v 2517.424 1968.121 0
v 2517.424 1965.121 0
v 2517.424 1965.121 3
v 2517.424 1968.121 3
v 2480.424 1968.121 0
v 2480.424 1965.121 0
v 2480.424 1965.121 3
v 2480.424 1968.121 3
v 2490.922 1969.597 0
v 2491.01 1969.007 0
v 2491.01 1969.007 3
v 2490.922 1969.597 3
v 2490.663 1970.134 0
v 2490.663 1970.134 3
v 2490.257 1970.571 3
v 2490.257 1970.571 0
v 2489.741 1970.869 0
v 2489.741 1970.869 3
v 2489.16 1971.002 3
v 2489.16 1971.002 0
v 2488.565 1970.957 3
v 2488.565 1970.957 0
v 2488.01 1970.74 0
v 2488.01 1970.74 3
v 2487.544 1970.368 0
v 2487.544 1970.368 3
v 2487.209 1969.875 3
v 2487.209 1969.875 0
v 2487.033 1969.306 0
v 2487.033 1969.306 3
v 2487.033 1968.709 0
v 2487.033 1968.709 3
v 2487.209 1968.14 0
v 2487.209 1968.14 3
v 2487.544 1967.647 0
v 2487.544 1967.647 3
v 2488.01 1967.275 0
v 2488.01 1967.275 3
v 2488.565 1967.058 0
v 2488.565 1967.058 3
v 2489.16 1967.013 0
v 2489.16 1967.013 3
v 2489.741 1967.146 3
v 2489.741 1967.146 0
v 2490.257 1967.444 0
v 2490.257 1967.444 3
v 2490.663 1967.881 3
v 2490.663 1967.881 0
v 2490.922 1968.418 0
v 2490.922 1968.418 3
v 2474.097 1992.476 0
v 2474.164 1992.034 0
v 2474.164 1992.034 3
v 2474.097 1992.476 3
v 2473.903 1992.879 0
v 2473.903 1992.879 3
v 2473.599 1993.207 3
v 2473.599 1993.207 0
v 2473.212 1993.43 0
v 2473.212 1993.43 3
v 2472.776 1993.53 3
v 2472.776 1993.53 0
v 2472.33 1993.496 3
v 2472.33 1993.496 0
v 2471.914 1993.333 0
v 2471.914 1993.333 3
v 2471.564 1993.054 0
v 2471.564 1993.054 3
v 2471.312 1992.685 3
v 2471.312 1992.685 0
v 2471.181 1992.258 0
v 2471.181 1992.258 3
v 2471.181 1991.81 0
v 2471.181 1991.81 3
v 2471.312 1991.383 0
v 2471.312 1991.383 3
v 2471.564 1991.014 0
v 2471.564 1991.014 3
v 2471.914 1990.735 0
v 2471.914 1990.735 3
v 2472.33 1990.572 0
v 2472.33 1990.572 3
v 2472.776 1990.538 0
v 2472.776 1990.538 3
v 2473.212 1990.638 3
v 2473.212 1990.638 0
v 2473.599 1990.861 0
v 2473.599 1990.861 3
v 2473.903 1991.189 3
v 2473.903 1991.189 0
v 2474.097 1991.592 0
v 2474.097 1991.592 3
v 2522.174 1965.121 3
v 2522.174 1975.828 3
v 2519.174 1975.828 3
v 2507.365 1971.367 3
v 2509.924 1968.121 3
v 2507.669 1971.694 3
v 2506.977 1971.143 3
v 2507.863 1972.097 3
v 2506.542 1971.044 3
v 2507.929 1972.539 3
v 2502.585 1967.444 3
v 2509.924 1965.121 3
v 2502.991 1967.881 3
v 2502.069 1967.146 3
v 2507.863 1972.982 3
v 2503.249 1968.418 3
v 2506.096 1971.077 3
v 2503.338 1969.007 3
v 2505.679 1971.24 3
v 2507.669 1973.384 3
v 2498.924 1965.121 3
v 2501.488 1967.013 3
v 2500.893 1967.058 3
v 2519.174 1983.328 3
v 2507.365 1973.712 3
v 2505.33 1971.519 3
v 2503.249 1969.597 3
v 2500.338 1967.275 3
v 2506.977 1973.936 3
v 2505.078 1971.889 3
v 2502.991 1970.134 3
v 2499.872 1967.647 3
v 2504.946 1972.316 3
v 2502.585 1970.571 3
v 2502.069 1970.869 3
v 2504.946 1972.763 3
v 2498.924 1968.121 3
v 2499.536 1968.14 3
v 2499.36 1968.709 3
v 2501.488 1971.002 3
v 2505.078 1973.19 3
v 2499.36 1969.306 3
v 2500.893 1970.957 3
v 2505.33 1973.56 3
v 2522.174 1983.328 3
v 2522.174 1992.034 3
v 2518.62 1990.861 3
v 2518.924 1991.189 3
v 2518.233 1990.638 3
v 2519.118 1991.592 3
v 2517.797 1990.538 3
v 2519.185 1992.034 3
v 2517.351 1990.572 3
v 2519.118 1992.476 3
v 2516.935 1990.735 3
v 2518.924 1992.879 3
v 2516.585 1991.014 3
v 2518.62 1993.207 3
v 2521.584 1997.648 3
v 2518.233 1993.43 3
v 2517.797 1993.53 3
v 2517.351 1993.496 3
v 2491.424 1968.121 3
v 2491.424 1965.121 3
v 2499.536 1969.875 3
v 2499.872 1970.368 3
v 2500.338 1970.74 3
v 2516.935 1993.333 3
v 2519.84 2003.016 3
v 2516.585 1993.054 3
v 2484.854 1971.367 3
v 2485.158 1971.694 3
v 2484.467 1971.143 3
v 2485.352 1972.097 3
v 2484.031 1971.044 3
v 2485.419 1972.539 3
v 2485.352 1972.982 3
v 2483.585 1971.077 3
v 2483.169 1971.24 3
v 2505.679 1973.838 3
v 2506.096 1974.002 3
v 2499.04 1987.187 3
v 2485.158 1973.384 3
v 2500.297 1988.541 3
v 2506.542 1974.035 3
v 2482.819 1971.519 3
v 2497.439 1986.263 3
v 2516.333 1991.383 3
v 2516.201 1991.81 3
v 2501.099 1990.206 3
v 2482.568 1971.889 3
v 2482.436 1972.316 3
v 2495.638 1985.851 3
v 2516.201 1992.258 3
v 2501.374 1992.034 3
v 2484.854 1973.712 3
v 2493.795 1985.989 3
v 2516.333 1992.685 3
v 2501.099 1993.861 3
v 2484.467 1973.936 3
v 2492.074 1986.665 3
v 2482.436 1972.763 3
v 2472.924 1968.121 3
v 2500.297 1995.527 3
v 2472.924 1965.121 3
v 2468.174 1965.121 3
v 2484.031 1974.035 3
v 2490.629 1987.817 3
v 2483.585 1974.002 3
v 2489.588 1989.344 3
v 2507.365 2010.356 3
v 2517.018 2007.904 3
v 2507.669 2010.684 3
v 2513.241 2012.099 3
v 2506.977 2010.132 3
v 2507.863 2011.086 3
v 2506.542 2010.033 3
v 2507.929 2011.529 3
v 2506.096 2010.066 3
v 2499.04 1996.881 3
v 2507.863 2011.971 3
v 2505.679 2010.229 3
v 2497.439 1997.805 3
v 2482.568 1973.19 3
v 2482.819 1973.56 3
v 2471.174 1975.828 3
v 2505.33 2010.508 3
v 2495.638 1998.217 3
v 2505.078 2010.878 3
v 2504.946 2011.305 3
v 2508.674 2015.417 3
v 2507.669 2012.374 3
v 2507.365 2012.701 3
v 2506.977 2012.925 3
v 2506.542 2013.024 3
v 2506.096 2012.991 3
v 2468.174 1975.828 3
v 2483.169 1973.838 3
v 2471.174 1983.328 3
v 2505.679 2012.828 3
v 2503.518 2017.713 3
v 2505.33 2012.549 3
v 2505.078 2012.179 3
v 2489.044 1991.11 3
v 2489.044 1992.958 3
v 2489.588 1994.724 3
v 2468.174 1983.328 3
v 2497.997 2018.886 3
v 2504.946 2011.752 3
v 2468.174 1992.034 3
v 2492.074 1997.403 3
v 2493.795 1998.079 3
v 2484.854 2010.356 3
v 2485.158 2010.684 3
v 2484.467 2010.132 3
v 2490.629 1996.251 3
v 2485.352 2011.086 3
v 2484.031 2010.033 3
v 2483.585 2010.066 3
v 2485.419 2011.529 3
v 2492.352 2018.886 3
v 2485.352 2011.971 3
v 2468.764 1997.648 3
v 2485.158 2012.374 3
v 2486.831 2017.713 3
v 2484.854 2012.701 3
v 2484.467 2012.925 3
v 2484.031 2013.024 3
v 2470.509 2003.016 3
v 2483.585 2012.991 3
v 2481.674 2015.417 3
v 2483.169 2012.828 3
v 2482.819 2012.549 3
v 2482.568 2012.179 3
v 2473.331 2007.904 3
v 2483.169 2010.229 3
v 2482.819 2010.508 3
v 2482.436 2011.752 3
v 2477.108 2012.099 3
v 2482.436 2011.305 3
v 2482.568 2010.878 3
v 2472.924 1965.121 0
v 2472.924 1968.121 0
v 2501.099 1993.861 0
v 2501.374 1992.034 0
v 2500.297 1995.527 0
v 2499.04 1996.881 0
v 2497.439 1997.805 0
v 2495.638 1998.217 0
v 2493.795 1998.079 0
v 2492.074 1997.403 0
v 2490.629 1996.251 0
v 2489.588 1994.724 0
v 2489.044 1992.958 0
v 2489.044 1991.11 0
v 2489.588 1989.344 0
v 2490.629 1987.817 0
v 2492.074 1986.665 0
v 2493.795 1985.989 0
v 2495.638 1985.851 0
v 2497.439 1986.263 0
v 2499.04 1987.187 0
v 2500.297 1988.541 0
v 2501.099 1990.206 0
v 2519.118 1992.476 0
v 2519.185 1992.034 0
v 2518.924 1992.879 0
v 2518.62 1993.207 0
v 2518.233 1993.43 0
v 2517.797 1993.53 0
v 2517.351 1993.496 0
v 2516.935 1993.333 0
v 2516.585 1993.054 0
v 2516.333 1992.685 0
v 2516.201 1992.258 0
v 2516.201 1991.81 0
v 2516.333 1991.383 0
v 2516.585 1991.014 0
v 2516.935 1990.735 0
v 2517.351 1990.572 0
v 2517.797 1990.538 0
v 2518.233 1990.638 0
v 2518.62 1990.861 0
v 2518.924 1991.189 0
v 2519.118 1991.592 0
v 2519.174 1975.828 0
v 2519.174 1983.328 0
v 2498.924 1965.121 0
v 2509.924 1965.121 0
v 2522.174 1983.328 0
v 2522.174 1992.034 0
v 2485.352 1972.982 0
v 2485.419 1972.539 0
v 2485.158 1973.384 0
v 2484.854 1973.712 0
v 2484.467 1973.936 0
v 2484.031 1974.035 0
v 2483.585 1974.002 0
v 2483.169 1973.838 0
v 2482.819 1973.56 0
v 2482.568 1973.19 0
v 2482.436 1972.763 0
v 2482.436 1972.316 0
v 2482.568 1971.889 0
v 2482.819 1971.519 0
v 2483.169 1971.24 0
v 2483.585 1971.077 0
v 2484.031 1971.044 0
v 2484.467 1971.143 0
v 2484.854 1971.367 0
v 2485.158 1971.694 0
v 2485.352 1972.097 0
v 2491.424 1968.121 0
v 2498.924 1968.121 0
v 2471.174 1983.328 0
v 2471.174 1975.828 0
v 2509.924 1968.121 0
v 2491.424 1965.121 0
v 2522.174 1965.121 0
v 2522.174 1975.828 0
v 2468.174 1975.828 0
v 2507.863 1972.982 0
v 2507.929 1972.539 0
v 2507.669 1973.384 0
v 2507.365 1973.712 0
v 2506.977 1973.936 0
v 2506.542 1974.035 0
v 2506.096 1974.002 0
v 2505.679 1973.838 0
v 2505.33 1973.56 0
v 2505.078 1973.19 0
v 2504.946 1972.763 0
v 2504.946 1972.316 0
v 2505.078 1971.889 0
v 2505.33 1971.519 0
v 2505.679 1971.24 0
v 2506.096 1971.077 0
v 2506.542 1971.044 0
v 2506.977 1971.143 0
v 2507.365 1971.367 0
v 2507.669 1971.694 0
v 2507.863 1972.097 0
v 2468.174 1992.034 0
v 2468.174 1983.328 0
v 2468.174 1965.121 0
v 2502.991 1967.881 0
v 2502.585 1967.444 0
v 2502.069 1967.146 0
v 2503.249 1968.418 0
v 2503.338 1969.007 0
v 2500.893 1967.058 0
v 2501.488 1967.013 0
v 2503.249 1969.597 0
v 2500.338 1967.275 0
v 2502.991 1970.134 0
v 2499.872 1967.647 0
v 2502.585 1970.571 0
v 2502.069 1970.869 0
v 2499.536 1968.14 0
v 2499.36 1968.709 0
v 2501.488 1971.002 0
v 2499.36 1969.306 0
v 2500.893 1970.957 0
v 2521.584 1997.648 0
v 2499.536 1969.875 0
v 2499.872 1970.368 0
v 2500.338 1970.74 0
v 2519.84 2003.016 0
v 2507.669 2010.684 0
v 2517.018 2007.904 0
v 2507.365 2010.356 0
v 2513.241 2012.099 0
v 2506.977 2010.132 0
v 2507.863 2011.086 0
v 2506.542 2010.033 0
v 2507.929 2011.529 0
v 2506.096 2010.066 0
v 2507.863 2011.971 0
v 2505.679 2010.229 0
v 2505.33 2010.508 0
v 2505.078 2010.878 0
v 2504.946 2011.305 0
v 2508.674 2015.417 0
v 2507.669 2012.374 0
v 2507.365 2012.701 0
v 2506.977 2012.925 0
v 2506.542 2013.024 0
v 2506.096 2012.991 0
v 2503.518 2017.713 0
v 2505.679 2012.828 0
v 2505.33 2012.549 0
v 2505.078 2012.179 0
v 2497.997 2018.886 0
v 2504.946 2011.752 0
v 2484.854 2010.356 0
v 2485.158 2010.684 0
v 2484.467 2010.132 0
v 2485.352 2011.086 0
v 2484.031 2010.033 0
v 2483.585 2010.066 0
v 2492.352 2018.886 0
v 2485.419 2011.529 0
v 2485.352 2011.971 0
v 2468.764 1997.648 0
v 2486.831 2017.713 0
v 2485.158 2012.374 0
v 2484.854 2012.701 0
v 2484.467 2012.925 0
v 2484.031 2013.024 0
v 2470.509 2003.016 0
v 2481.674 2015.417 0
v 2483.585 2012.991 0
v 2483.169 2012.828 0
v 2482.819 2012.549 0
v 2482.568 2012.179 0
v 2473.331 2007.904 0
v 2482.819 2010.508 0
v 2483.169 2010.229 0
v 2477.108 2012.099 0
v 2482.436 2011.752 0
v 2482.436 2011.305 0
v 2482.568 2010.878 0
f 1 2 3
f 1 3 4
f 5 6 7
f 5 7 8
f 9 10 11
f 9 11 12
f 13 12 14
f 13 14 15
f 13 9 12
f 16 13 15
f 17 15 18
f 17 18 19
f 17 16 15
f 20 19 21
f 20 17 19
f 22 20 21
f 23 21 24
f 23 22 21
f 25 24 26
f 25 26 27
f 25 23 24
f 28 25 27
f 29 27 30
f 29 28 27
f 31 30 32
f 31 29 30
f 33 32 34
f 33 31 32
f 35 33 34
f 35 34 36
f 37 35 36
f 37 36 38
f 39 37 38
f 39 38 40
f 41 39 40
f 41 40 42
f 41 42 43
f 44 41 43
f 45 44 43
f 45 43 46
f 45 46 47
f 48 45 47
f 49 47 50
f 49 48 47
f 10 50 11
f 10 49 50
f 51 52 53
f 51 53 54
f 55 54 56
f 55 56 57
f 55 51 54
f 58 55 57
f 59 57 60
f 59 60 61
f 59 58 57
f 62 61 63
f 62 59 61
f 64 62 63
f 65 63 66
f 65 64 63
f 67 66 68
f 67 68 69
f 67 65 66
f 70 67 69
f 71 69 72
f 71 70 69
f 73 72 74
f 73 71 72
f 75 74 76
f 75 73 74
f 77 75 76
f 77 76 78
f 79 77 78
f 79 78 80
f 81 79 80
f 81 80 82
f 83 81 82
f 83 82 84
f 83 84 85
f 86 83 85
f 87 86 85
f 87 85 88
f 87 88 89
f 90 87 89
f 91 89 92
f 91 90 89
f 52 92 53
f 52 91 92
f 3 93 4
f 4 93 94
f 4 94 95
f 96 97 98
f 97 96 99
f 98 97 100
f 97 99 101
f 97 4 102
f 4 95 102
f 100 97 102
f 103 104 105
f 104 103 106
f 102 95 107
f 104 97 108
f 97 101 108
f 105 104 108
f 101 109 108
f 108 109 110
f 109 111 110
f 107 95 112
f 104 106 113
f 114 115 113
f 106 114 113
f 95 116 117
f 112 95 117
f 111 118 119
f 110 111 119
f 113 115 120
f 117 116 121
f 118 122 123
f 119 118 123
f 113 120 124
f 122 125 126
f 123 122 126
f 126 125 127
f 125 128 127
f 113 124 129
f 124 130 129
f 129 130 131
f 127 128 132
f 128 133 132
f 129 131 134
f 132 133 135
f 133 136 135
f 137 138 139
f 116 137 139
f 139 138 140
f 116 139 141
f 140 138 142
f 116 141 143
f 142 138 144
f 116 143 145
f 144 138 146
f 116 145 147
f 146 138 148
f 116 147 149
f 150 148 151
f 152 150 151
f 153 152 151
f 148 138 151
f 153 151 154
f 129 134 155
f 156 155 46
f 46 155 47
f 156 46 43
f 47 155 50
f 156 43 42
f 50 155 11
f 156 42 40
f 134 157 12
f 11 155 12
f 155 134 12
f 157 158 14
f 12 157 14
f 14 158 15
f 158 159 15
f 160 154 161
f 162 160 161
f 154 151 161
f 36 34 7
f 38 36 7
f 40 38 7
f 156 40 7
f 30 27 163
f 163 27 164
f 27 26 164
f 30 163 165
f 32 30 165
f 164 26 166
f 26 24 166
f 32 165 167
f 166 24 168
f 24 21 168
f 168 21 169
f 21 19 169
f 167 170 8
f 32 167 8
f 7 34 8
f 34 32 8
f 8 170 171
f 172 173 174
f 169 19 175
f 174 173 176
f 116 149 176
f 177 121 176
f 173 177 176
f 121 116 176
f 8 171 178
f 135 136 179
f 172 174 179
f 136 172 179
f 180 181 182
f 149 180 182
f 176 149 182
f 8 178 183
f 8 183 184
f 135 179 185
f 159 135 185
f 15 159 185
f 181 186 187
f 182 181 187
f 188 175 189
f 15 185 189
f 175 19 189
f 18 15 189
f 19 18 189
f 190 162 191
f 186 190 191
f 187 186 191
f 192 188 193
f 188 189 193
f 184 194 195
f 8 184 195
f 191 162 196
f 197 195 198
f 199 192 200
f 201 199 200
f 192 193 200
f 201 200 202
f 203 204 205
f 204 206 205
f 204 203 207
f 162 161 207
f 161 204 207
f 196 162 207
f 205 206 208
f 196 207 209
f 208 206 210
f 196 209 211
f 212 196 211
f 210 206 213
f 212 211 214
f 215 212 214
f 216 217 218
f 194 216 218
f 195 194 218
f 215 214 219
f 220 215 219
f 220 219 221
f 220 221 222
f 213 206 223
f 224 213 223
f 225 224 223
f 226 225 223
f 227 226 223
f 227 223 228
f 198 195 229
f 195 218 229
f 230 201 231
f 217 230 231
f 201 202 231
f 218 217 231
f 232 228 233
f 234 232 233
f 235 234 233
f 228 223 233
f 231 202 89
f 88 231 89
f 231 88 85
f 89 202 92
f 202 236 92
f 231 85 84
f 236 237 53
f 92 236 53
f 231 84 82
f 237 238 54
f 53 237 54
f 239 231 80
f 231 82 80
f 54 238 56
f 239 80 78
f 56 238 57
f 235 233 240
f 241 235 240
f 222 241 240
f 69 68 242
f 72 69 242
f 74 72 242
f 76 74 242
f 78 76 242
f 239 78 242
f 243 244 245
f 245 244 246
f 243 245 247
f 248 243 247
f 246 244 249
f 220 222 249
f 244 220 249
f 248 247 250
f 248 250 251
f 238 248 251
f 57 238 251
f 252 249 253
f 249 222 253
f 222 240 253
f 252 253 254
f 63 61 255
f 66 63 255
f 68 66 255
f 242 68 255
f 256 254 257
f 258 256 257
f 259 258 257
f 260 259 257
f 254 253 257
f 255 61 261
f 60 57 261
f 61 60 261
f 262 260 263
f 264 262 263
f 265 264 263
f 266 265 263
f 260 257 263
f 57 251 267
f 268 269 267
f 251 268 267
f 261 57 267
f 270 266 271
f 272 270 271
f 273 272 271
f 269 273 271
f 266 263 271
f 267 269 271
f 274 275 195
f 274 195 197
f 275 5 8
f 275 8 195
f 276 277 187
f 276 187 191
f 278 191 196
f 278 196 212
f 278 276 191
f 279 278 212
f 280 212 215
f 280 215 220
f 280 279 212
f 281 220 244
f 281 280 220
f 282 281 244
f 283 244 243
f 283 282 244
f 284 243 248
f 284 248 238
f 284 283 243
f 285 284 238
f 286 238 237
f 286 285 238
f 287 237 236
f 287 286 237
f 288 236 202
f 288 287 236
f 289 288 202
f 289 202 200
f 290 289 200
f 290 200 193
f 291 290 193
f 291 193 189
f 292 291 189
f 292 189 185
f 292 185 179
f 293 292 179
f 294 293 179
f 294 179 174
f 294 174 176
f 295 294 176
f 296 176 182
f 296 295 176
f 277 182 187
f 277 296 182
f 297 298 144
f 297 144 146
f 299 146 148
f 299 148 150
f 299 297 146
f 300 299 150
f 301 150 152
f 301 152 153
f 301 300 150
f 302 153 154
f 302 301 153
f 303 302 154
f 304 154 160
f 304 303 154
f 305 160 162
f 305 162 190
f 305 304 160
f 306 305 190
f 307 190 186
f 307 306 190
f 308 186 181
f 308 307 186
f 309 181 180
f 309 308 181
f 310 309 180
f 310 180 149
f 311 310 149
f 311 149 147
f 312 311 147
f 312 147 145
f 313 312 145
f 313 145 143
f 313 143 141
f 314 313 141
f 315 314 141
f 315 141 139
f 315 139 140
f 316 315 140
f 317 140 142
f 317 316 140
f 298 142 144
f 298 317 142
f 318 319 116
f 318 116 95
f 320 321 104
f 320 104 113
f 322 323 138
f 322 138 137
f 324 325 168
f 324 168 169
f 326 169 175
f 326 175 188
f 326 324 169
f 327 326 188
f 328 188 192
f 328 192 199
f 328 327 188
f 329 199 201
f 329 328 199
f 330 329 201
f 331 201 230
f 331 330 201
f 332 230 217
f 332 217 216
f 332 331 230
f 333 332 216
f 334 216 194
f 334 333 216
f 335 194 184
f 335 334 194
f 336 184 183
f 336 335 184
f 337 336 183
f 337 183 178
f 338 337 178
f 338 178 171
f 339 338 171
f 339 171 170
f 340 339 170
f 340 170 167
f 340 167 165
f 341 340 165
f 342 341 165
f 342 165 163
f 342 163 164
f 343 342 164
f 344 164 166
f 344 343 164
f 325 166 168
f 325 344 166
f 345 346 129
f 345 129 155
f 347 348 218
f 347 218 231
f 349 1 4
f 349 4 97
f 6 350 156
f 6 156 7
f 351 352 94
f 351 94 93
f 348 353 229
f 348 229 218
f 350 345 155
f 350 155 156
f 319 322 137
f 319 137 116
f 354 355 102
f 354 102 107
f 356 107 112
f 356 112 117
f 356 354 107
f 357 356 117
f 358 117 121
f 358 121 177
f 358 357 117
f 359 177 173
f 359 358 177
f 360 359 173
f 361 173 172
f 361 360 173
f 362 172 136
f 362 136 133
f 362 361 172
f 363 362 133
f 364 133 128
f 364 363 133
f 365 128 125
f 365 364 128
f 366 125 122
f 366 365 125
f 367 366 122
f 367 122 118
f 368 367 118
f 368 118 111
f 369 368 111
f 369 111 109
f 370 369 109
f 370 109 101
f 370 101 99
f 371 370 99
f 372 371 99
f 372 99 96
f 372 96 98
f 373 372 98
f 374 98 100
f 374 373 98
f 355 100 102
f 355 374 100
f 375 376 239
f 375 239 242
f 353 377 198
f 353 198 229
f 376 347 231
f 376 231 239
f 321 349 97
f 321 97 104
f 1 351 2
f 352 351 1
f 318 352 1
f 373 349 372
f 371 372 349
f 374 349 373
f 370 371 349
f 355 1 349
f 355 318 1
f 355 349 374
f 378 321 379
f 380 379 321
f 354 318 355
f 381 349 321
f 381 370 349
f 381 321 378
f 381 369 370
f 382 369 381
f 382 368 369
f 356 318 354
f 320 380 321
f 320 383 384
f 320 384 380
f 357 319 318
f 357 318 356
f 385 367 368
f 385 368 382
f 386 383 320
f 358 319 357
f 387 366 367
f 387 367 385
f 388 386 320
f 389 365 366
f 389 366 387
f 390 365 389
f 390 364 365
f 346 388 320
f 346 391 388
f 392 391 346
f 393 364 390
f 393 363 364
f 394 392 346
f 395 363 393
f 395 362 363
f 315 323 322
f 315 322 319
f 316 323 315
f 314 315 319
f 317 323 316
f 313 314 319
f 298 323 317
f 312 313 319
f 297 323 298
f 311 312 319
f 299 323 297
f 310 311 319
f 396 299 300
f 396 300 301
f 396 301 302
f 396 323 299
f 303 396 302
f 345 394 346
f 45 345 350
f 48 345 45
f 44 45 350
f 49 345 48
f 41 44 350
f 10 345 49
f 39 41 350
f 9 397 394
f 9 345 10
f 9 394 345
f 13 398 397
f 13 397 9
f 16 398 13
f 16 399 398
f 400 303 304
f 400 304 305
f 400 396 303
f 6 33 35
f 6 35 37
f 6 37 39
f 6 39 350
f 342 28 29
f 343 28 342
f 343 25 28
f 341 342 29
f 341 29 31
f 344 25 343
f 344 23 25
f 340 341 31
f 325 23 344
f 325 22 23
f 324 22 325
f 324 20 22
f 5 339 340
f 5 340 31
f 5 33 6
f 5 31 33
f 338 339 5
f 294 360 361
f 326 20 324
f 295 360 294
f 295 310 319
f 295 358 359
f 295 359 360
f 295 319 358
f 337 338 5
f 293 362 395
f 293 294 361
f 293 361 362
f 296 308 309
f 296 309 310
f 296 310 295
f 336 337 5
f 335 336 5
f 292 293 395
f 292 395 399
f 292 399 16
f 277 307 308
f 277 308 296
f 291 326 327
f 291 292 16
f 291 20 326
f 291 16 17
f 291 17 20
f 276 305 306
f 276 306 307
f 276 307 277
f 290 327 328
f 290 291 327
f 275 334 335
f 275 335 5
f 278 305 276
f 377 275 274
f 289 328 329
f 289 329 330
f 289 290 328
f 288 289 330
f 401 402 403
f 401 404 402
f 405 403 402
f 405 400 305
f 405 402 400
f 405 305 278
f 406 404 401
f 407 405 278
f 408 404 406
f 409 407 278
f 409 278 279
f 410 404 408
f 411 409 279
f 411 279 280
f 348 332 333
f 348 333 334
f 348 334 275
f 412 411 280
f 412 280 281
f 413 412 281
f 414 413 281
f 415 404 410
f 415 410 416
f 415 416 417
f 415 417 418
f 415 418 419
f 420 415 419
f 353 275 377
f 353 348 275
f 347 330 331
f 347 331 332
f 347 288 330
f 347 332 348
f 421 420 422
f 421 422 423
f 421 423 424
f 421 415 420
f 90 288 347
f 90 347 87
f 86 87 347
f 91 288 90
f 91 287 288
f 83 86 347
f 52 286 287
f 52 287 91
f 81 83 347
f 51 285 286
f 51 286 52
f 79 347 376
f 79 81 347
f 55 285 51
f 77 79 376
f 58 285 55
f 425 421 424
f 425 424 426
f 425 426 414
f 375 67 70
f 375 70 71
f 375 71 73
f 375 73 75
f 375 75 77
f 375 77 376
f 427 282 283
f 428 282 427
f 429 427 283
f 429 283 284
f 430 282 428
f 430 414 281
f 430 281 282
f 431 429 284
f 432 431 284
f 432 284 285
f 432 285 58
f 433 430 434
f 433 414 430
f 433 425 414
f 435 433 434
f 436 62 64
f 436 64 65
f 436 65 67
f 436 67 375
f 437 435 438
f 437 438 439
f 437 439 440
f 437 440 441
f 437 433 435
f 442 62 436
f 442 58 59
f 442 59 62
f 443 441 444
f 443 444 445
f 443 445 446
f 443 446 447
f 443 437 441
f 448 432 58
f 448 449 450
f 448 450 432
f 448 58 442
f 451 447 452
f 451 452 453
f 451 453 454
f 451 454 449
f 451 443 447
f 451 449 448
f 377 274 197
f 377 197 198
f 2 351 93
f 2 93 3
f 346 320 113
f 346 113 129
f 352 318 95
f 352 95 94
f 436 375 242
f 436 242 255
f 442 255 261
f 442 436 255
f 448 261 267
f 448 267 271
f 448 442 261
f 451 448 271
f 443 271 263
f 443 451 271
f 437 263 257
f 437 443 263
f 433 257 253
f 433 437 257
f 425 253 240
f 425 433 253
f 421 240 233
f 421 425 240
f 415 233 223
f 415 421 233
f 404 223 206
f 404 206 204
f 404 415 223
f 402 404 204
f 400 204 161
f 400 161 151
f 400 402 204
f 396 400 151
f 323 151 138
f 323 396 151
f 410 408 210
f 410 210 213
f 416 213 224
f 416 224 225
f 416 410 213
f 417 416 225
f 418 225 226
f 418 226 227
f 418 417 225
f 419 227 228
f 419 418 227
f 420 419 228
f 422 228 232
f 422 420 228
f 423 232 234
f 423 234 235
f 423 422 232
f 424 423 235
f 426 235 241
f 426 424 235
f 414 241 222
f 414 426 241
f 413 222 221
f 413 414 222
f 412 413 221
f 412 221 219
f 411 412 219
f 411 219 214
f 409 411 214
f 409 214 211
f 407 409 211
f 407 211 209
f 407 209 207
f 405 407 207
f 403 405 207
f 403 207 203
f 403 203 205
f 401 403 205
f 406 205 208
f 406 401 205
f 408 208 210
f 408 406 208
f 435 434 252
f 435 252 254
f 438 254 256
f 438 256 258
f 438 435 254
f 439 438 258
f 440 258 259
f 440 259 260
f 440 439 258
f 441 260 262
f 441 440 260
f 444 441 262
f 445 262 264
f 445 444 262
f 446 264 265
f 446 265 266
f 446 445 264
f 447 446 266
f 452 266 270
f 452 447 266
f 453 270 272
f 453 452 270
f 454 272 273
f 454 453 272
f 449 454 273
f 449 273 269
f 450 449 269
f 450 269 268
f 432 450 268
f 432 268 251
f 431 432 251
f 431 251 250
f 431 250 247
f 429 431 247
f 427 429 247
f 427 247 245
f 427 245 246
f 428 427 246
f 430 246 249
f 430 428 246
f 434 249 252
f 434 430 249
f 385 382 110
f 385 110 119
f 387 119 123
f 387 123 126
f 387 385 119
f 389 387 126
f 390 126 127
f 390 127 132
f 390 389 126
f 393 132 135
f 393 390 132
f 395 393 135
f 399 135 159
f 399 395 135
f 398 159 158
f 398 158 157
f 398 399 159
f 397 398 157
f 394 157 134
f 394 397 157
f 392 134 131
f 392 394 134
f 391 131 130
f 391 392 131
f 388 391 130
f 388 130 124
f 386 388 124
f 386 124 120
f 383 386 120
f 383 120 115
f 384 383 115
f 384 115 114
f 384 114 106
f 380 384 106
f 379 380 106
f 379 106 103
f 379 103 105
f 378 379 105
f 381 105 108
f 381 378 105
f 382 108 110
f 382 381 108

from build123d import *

# Parameters (mm, degrees)
SKETCH_1_R      = 1.5
SKETCH_1_R_2    = 2
SKETCH_1_R_3    = 6.2
EXTRUDE_1_DEPTH = 3


with BuildPart() as part:
    # 草图1 → 凸台-拉伸1 (new body)
    with BuildSketch(Plane.XY):
        with BuildLine():
            Line((2522.174251857, 1992.03397428), (2522.174251857, 1983.327521496))
            Line((2522.174251857, 1983.327521496), (2519.174251857, 1983.327521496))
            Line((2519.174251857, 1983.327521496), (2519.174251857, 1975.827521496))
            Line((2519.174251857, 1975.827521496), (2522.174251857, 1975.827521496))
            Line((2522.174251857, 1975.827521496), (2522.174251857, 1965.121068713))
            Line((2522.174251857, 1965.121068713), (2517.424251857, 1965.121068713))
            Line((2517.424251857, 1965.121068713), (2517.424251857, 1968.121068713))
            Line((2517.424251857, 1968.121068713), (2509.924251857, 1968.121068713))
            Line((2509.924251857, 1968.121068713), (2509.924251857, 1965.121068713))
            Line((2509.924251857, 1965.121068713), (2498.924251857, 1965.121068713))
            Line((2498.924251857, 1965.121068713), (2498.924251857, 1968.121068713))
            Line((2498.924251857, 1968.121068713), (2491.424251857, 1968.121068713))
            Line((2491.424251857, 1968.121068713), (2491.424251857, 1965.121068713))
            Line((2491.424251857, 1965.121068713), (2480.424251857, 1965.121068713))
            Line((2480.424251857, 1965.121068713), (2480.424251857, 1968.121068713))
            Line((2480.424251857, 1968.121068713), (2472.924251857, 1968.121068713))
            Line((2472.924251857, 1968.121068713), (2472.924251857, 1965.121068713))
            Line((2472.924251857, 1965.121068713), (2468.174251857, 1965.121068713))
            Line((2468.174251857, 1965.121068713), (2468.174251857, 1975.827521496))
            Line((2468.174251857, 1975.827521496), (2471.174251857, 1975.827521496))
            Line((2471.174251857, 1975.827521496), (2471.174251857, 1983.327521496))
            Line((2471.174251857, 1983.327521496), (2468.174251857, 1983.327521496))
            Line((2468.174251857, 1983.327521496), (2468.174251857, 1992.03397428))
            ThreePointArc((2468.174251857, 1992.03397428), (2495.174251857, 2019.03397428), (2522.174251857, 1992.03397428))
        make_face()
        with Locations((2472.663889086, 1992.03397428)):
            Circle(SKETCH_1_R, mode=Mode.SUBTRACT)
        with Locations((2483.919070472, 2011.528520288)):
            Circle(SKETCH_1_R, mode=Mode.SUBTRACT)
        with Locations((2506.429433243, 2011.528520288)):
            Circle(SKETCH_1_R, mode=Mode.SUBTRACT)
        with Locations((2517.684614628, 1992.03397428)):
            Circle(SKETCH_1_R, mode=Mode.SUBTRACT)
        with Locations((2501.338054428, 1969.0074786)):
            Circle(SKETCH_1_R_2, mode=Mode.SUBTRACT)
        with Locations((2483.919070472, 1972.539428272)):
            Circle(SKETCH_1_R, mode=Mode.SUBTRACT)
        with Locations((2506.429433243, 1972.539428272)):
            Circle(SKETCH_1_R, mode=Mode.SUBTRACT)
        with Locations((2489.010449286, 1969.0074786)):
            Circle(SKETCH_1_R_2, mode=Mode.SUBTRACT)
        with Locations((2495.174251857, 1992.03397428)):
            Circle(SKETCH_1_R_3, mode=Mode.SUBTRACT)
    extrude(amount=EXTRUDE_1_DEPTH)


solid = part.part
